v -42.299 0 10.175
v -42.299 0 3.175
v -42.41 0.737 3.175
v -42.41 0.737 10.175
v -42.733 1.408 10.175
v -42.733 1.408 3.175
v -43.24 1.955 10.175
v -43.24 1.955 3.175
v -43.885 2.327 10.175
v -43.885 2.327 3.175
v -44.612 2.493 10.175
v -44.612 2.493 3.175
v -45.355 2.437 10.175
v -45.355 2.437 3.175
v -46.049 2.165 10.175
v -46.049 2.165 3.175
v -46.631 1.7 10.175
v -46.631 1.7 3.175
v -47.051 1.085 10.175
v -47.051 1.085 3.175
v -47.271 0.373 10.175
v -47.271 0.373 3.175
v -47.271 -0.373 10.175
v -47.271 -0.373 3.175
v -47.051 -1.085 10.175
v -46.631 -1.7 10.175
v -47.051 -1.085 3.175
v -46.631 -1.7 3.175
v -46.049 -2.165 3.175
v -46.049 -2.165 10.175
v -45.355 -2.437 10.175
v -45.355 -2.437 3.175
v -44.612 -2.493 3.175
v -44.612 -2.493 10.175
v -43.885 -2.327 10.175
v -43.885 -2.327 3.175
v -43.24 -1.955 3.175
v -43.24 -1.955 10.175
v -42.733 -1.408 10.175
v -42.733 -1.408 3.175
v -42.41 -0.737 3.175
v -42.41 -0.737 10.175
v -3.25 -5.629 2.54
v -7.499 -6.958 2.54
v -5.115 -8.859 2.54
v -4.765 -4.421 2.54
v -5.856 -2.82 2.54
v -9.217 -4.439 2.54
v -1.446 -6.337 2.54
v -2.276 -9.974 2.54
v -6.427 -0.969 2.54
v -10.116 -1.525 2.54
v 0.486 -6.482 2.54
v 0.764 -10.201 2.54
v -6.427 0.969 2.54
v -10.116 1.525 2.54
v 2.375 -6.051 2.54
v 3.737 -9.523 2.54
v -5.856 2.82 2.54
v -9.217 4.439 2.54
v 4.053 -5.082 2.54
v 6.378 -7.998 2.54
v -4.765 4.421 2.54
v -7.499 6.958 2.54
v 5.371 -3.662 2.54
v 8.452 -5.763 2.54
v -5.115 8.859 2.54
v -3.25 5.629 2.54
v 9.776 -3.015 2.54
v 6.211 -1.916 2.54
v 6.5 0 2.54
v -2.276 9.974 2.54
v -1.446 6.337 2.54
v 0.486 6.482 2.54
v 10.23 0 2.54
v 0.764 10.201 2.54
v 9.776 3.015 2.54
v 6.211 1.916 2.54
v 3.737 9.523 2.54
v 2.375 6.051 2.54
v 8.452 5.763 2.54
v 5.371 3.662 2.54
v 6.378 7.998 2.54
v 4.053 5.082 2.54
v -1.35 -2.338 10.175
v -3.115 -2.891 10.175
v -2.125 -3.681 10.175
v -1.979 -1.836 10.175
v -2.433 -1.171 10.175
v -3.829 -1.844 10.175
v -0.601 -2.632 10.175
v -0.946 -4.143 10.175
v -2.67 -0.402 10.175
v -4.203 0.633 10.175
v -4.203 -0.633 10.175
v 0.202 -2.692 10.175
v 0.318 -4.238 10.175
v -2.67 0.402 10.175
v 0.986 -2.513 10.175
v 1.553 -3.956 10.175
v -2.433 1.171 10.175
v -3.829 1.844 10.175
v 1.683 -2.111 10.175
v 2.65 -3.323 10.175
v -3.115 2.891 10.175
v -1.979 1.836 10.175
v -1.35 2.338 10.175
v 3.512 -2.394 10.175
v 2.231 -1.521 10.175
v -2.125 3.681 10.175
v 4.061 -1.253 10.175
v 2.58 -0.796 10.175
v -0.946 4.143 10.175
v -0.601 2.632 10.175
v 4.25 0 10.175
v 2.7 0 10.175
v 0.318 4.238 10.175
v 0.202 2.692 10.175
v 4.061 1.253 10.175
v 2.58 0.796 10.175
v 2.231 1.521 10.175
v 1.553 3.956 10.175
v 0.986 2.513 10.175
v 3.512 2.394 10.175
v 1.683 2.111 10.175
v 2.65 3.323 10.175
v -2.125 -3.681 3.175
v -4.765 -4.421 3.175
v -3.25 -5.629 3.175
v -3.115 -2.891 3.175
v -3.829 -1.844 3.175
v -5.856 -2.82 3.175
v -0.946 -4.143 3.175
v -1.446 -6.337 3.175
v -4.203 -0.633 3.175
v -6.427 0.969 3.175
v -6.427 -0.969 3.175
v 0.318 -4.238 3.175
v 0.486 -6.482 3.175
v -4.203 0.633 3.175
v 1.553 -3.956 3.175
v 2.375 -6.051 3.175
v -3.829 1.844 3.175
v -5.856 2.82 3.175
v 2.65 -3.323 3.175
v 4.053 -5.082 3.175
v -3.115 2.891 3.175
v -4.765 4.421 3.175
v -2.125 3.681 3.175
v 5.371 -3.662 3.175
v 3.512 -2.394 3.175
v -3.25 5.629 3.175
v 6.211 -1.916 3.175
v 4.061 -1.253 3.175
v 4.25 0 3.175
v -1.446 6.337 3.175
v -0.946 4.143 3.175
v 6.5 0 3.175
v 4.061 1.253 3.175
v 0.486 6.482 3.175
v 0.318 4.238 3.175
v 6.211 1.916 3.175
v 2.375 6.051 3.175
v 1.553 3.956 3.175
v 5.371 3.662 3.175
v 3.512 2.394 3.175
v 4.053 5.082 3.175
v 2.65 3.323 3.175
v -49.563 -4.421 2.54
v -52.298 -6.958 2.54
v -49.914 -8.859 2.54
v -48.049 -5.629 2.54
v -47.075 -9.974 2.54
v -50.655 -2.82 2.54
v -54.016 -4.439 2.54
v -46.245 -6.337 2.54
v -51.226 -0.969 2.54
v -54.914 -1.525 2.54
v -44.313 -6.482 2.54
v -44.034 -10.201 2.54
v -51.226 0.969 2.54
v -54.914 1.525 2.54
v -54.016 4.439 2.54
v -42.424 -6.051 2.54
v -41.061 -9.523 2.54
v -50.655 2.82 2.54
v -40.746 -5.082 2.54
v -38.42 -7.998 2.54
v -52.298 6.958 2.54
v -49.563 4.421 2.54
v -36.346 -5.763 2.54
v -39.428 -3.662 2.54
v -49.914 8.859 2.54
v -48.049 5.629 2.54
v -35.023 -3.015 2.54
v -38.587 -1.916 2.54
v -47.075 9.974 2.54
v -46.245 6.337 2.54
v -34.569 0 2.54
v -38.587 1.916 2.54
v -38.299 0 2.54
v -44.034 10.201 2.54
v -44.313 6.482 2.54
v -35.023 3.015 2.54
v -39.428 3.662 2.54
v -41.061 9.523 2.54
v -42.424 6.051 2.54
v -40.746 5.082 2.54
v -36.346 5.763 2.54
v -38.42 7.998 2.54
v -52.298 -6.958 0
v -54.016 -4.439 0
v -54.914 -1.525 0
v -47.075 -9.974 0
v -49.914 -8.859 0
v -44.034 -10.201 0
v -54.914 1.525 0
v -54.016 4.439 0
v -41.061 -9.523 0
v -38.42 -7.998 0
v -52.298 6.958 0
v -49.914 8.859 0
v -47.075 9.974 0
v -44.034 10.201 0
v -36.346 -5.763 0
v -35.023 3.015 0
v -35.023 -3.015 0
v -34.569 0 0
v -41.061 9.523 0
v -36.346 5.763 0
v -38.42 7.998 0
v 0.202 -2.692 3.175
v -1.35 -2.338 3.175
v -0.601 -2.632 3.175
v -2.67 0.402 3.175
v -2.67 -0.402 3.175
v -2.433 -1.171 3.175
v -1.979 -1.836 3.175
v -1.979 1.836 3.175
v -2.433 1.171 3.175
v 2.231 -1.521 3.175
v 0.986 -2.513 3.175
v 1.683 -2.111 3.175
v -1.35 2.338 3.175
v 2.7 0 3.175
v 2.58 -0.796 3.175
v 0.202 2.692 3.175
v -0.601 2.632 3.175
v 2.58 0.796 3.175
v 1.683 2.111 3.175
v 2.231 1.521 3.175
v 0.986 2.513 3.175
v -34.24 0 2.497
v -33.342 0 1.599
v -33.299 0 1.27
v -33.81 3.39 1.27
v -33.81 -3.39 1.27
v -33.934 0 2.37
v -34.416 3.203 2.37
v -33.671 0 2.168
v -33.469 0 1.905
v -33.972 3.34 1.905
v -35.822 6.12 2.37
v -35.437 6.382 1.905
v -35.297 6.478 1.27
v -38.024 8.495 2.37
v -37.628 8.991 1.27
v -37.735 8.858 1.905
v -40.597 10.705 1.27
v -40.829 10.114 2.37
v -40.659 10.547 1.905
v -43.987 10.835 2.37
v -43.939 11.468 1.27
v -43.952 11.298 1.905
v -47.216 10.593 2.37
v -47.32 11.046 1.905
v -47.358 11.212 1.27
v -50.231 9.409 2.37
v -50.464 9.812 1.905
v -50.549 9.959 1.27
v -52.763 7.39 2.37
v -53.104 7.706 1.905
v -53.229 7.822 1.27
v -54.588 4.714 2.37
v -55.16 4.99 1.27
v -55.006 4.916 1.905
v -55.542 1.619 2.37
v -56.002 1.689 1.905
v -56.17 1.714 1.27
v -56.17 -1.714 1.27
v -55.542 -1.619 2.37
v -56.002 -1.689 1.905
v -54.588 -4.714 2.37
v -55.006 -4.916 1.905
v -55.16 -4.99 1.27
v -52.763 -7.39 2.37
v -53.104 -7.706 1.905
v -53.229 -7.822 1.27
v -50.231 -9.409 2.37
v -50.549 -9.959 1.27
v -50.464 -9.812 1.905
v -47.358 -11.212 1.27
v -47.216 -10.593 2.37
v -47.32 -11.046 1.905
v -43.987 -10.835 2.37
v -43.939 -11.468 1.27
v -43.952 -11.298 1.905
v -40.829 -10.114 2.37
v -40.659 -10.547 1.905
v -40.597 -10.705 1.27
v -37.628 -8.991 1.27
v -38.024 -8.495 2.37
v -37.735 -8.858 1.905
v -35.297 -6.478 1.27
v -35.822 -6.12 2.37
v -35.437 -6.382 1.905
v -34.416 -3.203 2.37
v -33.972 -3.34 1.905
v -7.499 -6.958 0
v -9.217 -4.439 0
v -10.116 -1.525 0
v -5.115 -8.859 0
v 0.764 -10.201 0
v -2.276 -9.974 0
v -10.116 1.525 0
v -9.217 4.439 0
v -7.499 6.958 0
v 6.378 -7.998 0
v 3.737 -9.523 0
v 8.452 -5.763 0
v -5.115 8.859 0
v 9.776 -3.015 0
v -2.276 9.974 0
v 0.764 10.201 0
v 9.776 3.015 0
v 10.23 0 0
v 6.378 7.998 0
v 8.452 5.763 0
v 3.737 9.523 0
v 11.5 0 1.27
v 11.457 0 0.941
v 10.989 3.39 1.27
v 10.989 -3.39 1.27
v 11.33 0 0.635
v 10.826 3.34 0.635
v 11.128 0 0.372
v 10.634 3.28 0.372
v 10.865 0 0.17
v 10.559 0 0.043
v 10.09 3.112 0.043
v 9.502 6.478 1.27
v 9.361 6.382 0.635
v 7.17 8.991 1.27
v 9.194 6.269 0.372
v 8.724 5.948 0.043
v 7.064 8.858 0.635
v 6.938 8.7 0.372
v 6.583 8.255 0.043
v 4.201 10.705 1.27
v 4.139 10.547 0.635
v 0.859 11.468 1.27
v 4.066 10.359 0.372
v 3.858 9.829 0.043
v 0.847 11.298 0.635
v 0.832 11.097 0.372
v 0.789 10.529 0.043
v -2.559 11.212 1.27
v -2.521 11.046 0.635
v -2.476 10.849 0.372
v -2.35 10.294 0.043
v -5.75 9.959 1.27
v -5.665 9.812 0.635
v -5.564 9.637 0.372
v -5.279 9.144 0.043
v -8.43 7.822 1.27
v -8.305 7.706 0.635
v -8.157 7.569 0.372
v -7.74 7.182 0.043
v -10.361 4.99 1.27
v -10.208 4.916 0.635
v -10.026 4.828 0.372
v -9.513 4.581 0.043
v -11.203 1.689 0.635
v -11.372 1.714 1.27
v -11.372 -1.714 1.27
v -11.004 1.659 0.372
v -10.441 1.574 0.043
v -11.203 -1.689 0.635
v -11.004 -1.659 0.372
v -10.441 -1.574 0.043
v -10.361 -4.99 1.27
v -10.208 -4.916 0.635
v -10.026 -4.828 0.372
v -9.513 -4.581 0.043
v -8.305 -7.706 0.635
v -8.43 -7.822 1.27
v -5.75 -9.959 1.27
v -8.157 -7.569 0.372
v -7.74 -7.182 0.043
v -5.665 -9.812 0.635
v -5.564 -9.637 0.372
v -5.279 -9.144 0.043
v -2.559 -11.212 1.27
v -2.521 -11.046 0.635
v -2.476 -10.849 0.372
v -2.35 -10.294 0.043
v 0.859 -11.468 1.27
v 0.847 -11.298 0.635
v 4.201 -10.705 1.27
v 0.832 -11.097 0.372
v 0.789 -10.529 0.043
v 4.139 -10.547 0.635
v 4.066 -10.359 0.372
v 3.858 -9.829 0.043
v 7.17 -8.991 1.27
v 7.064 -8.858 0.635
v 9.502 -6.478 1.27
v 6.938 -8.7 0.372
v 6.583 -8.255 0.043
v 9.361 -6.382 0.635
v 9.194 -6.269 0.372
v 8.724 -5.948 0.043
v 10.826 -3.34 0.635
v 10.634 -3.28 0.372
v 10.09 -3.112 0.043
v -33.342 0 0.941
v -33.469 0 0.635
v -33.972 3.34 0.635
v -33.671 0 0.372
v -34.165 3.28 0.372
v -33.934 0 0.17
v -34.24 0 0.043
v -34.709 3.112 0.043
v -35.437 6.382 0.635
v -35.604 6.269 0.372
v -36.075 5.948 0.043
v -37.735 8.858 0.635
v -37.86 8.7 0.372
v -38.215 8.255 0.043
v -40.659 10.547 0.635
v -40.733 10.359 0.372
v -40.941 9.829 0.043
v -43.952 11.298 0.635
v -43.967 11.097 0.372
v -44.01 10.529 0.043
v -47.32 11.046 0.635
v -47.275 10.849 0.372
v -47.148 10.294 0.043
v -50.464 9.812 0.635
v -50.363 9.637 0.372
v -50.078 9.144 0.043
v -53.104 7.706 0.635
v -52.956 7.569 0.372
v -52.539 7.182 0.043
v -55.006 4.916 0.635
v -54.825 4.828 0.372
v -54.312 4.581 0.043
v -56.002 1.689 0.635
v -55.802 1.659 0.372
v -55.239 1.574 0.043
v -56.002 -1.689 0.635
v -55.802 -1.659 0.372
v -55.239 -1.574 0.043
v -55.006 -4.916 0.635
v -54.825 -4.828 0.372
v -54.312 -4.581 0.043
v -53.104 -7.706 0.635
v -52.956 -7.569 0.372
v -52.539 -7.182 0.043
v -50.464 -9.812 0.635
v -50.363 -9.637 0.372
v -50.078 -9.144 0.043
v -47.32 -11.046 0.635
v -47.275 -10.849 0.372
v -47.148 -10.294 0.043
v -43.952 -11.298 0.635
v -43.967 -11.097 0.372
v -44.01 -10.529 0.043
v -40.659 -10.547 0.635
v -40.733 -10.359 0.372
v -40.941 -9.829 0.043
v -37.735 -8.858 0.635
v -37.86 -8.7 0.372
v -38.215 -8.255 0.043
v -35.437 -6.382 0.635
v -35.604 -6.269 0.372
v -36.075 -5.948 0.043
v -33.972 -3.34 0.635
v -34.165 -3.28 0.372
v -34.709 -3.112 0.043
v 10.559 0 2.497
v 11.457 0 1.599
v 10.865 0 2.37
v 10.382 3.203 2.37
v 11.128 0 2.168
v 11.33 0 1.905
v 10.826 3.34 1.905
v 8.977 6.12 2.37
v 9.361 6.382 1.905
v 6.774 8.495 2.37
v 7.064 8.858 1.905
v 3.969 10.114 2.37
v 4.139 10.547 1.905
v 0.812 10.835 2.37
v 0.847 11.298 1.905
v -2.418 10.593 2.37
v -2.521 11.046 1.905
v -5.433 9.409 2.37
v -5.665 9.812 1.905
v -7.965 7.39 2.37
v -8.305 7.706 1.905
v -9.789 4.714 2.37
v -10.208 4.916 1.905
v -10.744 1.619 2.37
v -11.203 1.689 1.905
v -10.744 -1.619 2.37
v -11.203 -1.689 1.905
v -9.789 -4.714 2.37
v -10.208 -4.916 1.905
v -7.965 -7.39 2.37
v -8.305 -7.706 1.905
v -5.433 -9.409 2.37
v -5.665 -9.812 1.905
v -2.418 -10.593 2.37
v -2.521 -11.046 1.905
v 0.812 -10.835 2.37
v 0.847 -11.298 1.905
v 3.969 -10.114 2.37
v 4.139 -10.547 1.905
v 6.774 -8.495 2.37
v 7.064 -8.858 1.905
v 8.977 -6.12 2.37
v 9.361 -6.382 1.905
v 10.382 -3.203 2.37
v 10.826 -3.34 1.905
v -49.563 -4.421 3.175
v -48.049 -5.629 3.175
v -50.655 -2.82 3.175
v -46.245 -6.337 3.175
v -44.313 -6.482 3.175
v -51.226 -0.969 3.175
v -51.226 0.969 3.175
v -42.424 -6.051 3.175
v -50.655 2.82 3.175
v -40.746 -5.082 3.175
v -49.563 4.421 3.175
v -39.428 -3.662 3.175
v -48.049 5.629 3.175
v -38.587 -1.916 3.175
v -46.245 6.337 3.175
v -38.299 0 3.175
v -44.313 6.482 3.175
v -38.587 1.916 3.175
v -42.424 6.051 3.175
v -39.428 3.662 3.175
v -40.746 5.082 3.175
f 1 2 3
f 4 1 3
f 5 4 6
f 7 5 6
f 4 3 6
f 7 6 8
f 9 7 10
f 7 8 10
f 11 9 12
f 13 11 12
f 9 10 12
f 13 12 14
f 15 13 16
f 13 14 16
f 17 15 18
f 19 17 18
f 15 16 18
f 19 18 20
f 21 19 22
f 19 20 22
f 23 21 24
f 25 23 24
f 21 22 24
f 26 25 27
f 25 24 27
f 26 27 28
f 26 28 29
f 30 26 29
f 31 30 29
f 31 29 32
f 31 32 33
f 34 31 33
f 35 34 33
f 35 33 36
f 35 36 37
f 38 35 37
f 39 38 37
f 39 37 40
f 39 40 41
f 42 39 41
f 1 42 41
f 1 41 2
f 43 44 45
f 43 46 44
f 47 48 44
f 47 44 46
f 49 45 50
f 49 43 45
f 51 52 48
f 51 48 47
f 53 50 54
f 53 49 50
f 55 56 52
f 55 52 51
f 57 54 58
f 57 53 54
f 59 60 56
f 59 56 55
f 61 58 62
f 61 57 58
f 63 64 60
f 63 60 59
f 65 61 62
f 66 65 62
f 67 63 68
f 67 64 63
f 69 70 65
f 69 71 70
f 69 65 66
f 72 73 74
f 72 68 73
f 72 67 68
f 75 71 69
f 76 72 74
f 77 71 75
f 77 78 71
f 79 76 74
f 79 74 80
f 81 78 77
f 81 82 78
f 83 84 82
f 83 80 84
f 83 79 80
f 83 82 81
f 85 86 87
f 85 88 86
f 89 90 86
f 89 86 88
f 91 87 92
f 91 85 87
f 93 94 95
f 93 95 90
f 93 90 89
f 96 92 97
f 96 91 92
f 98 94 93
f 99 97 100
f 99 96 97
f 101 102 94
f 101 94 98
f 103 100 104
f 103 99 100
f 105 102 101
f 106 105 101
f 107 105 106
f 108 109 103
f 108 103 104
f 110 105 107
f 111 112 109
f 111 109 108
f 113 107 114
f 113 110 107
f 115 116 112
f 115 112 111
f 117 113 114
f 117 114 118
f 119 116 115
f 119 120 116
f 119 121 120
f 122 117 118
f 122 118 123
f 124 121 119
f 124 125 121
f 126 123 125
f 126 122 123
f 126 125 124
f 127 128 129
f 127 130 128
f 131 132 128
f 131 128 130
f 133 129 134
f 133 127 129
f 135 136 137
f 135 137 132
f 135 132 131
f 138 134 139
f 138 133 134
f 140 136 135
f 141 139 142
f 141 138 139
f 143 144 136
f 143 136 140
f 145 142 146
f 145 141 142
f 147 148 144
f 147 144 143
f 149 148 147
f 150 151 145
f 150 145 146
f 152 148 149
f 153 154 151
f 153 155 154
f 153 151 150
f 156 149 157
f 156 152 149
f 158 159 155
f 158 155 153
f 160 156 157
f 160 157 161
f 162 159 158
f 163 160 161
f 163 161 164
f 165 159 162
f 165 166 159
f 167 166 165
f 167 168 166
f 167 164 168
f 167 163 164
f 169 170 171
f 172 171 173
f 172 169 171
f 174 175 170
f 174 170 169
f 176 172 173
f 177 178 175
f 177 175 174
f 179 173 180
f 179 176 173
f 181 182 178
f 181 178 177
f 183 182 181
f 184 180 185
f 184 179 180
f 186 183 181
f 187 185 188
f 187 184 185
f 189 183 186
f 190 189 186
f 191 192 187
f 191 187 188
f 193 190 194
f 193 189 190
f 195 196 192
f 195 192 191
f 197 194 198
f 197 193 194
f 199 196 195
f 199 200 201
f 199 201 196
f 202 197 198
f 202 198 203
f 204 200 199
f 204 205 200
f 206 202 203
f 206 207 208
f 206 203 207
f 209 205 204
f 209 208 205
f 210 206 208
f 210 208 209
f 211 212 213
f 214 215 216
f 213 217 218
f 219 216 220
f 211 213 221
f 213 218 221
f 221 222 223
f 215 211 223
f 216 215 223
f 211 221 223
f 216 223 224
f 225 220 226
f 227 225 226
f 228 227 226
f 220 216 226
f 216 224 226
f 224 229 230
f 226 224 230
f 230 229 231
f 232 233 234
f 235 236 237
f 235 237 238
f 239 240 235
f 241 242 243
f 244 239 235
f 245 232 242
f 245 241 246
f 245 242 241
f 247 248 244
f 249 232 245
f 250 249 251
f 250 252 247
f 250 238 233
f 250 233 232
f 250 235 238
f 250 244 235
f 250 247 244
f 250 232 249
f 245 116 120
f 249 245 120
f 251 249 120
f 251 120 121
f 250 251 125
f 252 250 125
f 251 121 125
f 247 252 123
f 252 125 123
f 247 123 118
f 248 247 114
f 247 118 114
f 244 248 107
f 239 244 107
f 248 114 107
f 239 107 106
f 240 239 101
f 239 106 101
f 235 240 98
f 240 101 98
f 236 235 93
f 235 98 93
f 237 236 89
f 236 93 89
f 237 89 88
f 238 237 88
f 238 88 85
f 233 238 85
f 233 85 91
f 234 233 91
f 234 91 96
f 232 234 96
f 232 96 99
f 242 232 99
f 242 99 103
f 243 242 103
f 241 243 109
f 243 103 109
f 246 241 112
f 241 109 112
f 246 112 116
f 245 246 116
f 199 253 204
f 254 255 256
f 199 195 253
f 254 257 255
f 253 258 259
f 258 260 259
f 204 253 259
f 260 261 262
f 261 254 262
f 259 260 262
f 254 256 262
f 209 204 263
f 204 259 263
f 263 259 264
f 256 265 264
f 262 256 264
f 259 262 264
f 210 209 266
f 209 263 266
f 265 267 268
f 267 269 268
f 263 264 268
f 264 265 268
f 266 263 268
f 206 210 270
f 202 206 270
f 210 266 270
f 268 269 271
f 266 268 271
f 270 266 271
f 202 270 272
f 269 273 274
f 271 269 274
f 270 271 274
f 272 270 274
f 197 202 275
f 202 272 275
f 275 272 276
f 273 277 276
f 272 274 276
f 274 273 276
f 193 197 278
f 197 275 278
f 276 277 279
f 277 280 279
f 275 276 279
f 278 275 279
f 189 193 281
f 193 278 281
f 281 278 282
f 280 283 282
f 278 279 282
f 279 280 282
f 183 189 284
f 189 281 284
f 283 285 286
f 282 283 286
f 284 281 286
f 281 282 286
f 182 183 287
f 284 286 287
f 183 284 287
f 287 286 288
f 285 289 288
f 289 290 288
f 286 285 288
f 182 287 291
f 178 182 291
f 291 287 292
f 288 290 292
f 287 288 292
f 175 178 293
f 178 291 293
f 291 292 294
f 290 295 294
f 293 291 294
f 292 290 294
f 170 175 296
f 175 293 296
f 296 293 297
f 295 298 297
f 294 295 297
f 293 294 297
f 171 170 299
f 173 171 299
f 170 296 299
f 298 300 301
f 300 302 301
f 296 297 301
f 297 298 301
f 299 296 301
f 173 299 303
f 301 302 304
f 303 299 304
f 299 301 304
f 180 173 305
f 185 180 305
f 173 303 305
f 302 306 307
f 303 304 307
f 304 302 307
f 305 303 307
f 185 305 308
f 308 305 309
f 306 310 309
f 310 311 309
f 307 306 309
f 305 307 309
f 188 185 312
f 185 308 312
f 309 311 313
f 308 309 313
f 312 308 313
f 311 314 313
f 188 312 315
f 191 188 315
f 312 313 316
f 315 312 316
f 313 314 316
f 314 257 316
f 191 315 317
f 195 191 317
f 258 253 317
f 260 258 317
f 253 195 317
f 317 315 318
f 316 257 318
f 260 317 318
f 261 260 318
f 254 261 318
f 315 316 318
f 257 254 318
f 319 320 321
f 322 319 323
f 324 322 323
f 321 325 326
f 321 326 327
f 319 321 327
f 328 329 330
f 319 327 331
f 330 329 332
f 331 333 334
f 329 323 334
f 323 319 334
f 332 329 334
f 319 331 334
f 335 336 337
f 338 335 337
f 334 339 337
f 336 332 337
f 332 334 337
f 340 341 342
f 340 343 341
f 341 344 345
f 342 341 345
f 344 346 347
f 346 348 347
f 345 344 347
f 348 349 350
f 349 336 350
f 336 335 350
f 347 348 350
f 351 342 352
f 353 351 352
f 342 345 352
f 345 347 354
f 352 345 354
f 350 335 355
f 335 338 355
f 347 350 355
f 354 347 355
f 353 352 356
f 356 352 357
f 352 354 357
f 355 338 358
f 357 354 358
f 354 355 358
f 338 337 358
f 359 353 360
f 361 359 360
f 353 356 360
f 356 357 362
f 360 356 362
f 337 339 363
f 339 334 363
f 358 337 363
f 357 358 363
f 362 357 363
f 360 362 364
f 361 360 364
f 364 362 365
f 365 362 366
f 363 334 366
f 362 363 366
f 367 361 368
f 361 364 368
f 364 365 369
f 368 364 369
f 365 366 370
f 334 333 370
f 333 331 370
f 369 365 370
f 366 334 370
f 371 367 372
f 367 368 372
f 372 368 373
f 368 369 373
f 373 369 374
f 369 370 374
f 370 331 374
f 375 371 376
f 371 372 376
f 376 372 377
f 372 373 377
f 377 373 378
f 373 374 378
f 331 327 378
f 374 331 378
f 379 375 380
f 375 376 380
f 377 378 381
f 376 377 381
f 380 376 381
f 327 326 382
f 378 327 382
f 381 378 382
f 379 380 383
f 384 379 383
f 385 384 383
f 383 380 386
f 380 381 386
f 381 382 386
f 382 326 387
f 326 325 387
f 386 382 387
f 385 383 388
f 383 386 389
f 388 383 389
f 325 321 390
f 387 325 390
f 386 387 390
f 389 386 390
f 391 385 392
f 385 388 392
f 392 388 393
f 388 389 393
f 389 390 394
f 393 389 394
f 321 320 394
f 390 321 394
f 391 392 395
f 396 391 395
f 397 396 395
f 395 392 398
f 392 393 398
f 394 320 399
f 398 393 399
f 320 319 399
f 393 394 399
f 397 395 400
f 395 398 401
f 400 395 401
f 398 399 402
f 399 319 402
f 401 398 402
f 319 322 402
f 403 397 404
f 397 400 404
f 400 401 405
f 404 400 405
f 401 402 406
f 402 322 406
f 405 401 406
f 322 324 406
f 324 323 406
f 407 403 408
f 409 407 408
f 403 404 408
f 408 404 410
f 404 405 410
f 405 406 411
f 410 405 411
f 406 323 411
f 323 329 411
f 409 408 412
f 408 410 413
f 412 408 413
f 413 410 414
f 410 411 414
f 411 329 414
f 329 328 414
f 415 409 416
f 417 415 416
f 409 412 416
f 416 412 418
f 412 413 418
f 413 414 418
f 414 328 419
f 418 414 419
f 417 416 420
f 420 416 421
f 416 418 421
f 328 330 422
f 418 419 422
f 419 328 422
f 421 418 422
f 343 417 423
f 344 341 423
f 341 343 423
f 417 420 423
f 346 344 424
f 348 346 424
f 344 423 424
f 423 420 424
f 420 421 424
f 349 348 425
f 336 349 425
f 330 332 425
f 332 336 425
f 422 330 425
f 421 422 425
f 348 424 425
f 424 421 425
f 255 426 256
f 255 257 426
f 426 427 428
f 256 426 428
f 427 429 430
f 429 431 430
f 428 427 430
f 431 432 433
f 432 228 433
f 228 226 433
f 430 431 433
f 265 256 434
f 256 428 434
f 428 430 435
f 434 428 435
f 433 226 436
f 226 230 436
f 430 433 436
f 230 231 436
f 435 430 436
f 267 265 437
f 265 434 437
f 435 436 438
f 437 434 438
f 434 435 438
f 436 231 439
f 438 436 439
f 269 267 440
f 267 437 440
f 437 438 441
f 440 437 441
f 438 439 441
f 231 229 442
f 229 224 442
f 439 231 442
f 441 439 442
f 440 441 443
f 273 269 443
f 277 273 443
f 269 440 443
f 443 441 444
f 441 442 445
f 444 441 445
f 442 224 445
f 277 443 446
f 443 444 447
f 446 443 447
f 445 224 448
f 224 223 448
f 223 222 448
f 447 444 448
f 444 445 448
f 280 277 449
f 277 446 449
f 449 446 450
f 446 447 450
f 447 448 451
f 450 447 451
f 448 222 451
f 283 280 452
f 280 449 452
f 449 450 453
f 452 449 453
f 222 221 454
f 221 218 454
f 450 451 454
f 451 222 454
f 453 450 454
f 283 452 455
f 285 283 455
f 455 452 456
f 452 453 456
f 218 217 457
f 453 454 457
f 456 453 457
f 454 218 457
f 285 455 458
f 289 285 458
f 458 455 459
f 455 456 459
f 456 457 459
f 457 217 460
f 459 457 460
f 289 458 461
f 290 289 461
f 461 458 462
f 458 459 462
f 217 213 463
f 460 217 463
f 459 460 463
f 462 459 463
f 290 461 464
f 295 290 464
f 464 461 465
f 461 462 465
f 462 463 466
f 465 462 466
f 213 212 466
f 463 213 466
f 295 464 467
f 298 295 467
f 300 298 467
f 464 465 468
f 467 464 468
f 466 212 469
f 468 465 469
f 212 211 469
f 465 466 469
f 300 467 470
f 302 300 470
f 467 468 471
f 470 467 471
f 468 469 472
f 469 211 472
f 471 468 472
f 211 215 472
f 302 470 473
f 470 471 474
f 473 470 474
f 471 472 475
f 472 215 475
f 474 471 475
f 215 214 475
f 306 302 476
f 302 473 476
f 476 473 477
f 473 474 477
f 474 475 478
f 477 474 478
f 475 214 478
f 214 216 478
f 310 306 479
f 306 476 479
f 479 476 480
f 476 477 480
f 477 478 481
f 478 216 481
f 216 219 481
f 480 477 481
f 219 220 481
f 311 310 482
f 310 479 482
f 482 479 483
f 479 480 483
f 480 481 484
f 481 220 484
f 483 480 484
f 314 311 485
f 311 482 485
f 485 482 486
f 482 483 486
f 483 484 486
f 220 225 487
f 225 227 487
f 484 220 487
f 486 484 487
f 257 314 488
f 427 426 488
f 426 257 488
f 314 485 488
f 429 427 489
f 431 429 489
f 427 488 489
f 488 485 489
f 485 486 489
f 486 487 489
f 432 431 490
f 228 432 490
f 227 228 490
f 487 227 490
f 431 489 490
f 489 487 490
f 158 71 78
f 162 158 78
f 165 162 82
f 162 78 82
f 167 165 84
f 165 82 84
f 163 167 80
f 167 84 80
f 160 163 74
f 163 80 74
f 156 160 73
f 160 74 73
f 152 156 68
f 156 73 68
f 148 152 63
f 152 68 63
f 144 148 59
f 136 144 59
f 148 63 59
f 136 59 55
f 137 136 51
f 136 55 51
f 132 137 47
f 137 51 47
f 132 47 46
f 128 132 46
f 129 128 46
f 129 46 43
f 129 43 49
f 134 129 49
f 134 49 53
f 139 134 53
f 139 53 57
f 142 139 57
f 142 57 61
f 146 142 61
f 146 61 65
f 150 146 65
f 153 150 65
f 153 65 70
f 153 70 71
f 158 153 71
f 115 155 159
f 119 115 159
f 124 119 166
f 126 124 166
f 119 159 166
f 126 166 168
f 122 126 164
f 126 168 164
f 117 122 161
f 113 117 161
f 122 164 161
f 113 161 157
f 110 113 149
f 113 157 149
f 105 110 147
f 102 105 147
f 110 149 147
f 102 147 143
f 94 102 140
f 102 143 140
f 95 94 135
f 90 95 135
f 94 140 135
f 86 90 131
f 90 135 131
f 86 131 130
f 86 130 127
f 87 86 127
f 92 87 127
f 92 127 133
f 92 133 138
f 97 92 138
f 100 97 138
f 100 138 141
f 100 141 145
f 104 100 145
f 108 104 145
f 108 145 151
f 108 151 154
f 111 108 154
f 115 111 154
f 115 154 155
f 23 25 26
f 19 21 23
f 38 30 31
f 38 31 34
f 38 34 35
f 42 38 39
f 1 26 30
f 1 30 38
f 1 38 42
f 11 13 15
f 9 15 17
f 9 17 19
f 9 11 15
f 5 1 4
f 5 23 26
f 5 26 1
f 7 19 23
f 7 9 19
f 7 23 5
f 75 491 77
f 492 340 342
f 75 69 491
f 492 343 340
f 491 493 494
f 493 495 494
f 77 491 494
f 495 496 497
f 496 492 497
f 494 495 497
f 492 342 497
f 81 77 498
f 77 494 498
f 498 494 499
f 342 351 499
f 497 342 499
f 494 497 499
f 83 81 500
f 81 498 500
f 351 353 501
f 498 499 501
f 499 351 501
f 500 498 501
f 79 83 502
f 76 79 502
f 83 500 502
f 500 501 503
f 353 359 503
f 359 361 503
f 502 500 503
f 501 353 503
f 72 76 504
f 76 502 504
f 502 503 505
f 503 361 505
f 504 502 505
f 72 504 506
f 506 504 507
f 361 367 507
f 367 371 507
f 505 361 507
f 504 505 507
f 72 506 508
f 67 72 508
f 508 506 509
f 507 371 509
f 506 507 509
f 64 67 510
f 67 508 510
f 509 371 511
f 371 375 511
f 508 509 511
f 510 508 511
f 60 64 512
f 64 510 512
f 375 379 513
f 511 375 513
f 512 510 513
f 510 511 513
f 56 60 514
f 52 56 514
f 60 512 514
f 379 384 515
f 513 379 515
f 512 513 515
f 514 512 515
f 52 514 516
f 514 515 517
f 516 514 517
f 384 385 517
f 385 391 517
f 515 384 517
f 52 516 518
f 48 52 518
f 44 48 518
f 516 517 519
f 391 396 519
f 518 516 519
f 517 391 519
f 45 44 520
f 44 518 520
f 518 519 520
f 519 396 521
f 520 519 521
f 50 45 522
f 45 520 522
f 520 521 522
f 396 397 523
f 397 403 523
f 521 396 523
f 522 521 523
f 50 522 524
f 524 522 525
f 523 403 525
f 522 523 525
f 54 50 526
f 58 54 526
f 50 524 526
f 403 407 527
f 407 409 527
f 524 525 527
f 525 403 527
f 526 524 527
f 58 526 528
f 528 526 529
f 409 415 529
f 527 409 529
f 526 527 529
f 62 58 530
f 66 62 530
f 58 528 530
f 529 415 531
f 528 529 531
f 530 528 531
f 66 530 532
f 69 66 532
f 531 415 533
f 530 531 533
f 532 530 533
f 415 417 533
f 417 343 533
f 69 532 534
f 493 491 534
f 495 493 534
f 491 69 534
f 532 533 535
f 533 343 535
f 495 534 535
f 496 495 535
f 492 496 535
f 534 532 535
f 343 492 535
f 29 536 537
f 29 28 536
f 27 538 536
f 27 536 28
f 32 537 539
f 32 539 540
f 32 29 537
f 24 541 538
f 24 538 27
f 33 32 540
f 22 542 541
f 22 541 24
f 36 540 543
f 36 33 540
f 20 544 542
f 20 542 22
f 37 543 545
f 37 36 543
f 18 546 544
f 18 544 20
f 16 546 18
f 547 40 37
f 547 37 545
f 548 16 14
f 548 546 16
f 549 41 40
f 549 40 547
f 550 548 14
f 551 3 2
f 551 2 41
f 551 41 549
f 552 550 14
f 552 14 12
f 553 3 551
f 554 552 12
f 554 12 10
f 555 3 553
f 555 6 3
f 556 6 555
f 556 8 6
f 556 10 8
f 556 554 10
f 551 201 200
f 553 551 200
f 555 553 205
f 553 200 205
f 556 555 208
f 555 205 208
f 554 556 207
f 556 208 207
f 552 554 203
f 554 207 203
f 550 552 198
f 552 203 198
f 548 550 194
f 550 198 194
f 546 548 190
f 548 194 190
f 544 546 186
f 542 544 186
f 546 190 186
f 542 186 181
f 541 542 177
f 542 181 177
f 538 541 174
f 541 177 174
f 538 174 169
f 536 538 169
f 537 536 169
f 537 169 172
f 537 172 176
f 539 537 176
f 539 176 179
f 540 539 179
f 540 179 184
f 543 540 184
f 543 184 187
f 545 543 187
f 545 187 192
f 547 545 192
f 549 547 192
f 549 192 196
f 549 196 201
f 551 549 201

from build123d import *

# Parameters (mm, degrees)
F0_R      = 11.5
F0_R_2    = 6.5
F1_DEPTH  = 2.54
F0_R_3    = 4.25
F2_DEPTH  = 3.175
F3_DEPTH  = 10.175
F4_R      = 1.26999
F5_R      = 11.5
F5_R_2    = 6.5
F6_DEPTH  = 2.54
F5_R_3    = 2.5
F7_DEPTH  = 3.175
F8_DEPTH  = 10.175
F9_R      = 2.7
F10_DEPTH = 7
F11_R     = 1.26999


# Not quite as in the source:
# - a fillet or chamfer is up to 0.001 mm smaller than in the source, because OpenCascade refuses the exact size


with BuildPart() as f1:
    # F0 (on Top) → F1 (new body)
    with BuildSketch(Plane.XY):
        Circle(F0_R)
        Circle(F0_R_2, mode=Mode.SUBTRACT)
    extrude(amount=F1_DEPTH)

    # F0 (on Top) → F2 (join)
    with BuildSketch(Plane.XY):
        Circle(F0_R_2)
        Circle(F0_R_3, mode=Mode.SUBTRACT)
    extrude(amount=F2_DEPTH)

    # F0 (on Top) → F3 (join)
    with BuildSketch(Plane.XY):
        Circle(F0_R_3)
    extrude(amount=F3_DEPTH)

    # F4 (radius 1.27 in the source; OpenCascade refuses exactly that, so slightly less here)
    f4_edges = [f1.edges().sort_by_distance(p)[0] for p in [
        (-11.5, 0, 2.54),
        (-11.5, 0, 0),
    ]]
    fillet(f4_edges, radius=F4_R)

    # F9 (on face) → F10 (cut)
    with BuildSketch(Plane.XY.offset(10.175)):
        Circle(F9_R)
    extrude(amount=-F10_DEPTH, mode=Mode.SUBTRACT)


with BuildPart() as f6:
    # F5 (on Top) → F6 (new body)
    with BuildSketch(Plane.XY):
        with Locations((-44.7985892718, 0)):
            Circle(F5_R)
        with Locations((-44.7985892718, 0)):
            Circle(F5_R_2, mode=Mode.SUBTRACT)
    extrude(amount=F6_DEPTH)

    # F5 (on Top) → F7 (join)
    with BuildSketch(Plane.XY):
        with Locations((-44.7985892718, 0)):
            Circle(F5_R_2)
        with Locations((-44.7985892718, 0)):
            Circle(F5_R_3, mode=Mode.SUBTRACT)
    extrude(amount=F7_DEPTH)

    # F5 (on Top) → F8 (join)
    with BuildSketch(Plane.XY):
        with Locations((-44.7985892718, 0)):
            Circle(F5_R_3)
    extrude(amount=F8_DEPTH)

    # F11 (radius 1.27 in the source; OpenCascade refuses exactly that, so slightly less here)
    f11_edges = [f6.edges().sort_by_distance(p)[0] for p in [
        (-56.298589, 0, 2.54),
        (-56.298589, 0, 0),
    ]]
    fillet(f11_edges, radius=F11_R)


solid = Compound([f1.part, f6.part])
